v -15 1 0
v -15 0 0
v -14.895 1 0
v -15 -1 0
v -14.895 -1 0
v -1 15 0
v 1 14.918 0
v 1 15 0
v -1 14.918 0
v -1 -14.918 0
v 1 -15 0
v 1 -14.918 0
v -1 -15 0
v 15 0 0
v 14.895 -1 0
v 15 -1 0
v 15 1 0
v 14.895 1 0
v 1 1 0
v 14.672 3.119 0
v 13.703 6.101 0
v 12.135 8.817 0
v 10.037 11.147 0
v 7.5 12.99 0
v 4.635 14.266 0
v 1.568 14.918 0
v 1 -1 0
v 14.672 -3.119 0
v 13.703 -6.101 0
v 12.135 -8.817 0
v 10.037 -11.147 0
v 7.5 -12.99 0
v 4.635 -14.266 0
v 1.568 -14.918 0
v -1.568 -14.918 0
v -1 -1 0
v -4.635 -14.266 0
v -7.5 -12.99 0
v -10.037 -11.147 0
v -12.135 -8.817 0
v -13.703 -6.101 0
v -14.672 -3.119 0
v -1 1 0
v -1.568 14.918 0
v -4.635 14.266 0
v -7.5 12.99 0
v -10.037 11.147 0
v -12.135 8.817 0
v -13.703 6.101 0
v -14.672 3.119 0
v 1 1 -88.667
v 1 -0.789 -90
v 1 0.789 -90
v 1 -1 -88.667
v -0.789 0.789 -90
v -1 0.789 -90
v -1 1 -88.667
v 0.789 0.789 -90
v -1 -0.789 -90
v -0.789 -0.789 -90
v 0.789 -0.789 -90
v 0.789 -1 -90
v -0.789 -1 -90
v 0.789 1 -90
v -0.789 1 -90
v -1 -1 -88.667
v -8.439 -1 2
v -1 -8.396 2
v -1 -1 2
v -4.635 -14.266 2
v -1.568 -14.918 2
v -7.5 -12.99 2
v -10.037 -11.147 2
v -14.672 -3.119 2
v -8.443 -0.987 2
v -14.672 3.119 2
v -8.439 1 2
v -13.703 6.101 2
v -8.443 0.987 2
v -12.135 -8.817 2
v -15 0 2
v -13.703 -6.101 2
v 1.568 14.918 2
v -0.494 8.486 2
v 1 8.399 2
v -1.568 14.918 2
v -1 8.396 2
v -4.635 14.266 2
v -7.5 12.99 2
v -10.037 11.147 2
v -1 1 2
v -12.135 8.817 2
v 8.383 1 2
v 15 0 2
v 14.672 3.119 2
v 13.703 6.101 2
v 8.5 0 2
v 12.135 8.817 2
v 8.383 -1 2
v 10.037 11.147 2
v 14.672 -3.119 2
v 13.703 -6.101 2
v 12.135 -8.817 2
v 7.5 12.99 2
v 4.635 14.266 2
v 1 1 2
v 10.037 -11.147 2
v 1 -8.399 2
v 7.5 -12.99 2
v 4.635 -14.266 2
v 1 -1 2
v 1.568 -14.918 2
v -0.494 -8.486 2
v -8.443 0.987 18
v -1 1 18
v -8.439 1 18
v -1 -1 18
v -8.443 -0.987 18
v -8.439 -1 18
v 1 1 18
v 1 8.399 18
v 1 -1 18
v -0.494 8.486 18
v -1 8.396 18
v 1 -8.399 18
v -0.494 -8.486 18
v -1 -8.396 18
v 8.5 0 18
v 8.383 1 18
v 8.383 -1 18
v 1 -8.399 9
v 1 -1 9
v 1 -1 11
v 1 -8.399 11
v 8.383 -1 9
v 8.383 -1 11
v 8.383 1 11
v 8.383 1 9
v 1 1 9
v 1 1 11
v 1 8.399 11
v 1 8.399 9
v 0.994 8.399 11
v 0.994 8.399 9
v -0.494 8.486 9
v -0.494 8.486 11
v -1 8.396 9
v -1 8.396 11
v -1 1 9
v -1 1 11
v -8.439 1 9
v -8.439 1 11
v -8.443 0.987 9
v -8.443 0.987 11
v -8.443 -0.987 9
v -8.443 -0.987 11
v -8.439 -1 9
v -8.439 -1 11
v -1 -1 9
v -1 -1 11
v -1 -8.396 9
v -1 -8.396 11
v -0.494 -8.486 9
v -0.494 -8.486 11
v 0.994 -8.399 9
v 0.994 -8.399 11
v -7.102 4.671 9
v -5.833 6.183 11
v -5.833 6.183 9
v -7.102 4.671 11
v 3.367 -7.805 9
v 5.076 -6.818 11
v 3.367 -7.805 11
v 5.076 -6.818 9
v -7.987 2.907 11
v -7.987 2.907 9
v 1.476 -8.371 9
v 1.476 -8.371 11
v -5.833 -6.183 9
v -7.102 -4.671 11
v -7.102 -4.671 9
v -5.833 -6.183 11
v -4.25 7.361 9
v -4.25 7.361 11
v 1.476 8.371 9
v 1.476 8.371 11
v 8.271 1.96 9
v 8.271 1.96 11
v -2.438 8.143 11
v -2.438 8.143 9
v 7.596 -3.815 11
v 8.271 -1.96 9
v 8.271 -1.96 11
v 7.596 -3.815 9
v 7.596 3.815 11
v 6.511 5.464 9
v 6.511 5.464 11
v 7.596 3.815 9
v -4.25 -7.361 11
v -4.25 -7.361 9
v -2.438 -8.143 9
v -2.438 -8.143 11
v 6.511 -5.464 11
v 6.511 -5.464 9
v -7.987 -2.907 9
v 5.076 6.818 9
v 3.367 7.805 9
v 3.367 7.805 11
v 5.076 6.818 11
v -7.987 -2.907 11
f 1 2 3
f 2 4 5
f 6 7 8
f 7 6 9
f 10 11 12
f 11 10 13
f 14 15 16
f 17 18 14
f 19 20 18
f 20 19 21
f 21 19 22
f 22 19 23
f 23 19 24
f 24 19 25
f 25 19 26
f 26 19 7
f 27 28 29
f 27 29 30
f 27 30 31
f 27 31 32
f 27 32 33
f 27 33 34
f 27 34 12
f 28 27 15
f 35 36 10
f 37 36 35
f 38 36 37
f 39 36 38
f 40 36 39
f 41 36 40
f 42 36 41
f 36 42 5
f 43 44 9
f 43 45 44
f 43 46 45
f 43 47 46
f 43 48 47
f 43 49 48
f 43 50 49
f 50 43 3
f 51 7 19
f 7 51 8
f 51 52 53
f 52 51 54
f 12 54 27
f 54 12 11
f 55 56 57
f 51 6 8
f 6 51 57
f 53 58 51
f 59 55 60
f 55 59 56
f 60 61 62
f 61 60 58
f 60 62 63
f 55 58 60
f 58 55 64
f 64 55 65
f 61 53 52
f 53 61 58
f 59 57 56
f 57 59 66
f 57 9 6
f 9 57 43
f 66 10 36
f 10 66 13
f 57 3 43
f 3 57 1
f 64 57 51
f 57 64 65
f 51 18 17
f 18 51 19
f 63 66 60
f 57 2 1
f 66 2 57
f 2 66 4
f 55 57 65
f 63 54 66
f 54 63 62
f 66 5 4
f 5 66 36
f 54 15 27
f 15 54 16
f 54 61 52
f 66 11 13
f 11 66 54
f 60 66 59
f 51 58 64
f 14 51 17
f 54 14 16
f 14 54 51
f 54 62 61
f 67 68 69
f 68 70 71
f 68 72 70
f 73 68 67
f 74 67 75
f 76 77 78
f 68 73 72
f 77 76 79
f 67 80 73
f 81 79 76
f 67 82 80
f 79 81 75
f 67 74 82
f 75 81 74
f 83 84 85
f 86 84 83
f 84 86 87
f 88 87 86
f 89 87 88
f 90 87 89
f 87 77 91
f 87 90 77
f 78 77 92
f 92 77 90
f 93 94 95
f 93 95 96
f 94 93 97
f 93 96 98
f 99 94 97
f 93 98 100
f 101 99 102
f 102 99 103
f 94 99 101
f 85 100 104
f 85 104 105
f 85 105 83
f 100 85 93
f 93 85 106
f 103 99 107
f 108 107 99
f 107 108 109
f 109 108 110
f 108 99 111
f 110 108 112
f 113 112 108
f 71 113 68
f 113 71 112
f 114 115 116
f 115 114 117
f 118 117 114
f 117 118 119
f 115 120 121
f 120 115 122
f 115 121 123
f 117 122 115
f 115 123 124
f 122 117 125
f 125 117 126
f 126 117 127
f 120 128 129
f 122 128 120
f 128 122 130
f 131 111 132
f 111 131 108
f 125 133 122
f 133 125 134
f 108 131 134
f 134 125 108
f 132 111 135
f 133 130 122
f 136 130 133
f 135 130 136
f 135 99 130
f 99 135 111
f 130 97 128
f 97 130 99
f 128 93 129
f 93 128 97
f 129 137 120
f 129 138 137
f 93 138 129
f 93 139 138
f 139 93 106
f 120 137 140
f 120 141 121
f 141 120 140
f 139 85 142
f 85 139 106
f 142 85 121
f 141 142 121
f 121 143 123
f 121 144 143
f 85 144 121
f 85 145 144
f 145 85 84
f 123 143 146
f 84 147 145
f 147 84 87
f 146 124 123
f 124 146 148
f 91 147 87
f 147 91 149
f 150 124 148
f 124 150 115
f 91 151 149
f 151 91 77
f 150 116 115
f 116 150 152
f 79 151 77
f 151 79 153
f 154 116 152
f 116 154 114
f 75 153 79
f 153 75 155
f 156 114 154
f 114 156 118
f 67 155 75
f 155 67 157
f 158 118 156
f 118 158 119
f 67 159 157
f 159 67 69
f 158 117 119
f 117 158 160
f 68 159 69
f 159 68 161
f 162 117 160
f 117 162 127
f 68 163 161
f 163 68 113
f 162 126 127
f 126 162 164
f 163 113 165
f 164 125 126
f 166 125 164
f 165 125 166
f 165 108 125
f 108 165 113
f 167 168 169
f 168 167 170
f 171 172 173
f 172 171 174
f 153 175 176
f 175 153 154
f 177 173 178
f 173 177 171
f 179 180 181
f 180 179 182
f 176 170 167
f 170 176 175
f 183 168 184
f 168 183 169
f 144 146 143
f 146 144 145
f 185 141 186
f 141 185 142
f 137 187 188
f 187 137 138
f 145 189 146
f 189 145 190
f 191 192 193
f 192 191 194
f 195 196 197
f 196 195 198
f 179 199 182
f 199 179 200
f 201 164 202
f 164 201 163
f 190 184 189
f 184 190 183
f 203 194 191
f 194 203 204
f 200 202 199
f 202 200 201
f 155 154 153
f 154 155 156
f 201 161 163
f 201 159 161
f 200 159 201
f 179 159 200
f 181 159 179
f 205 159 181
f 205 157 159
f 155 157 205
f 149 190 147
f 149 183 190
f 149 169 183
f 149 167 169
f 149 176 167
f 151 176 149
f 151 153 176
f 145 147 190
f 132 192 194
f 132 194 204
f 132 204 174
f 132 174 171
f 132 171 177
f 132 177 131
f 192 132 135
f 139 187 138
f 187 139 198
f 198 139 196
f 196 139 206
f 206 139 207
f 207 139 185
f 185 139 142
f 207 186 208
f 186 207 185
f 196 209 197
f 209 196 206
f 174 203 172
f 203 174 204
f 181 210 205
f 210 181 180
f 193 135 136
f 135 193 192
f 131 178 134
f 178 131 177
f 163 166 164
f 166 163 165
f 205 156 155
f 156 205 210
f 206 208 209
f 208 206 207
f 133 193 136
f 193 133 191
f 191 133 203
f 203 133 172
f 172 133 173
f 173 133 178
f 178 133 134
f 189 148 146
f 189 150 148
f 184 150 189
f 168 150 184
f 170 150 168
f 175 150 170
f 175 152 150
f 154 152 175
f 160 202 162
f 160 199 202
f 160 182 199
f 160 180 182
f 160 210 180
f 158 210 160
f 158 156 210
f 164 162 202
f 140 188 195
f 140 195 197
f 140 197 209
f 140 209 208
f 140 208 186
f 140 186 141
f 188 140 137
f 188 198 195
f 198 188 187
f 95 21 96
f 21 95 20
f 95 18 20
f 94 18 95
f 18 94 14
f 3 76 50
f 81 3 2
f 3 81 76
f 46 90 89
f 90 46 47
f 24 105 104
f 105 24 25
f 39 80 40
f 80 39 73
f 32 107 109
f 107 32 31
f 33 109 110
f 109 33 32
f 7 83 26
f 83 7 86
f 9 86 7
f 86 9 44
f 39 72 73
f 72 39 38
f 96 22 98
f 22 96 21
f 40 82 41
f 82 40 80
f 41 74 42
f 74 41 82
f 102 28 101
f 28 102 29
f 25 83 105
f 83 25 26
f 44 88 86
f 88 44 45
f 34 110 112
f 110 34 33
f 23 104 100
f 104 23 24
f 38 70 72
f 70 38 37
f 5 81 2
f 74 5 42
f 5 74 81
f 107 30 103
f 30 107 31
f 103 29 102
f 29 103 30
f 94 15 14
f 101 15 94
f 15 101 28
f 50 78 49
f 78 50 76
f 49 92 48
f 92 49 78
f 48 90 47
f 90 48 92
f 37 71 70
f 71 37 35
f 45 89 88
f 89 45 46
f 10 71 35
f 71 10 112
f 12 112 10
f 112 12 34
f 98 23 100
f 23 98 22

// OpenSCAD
// [FL_INDEX: keywords="openscad, 3d_parametric, Stake_for_solar_landscape_light, csg_solid" | COT="Parametric OpenSCAD design from 3DCodeverse"]
// Title: Stake for solar landscape light

// how tall to make the top section
cap_riser_height = 16;
// the diameter of the top section
cap_riser_width = 17;
// how thick the top section's straight sections are (the + section)
cap_riser_thickness = 2;
// how far from the top to put the circular section of the top
cap_circle_offset = 9;

// how thick to make the circle dividing the point from the cap
cap_divider_thickness = 2;

// length of the stake's point
point_height = 95;
// radius of the top section of the stake
point_top_radius = 15;
// how much of the stake to cutoff, making it have a blunt edge
point_tip_cutoff = 5;
// how thick the stake's sections should be
point_thickness = 2;



/*****************
 The bottom pointy part
 */

module stake_edge(height, top_radius, tip_cutoff=10, thickness=2) {
  rotate([0, 90, 0])
    linear_extrude(height=thickness, center=true)
    difference() {
      // triangle
      polygon(points = [[0, 0], [0, top_radius], [height, 0]],
              paths=[[0, 1, 2]]);
    // the square for cutting off the tip
    translate([height - tip_cutoff, 0, 0]) {
      square([tip_cutoff, top_radius * 2]);
    }
  }
}

// all arguments expected to be in the same base syste
// final_radius should be about 5 (.5cm)
module stake_point(height, top_radius, tip_cutoff=10, thickness=2) {
  union() {
    stake_edge(height, top_radius, tip_cutoff, thickness);
    rotate(90) stake_edge(height, top_radius, tip_cutoff, thickness);
    rotate(180) stake_edge(height, top_radius, tip_cutoff, thickness);
    rotate(270) stake_edge(height, top_radius, tip_cutoff, thickness);
  }
}

module circle_at_top_of_point(radius, thickness) {
  linear_extrude(height=thickness)
    circle(r=radius);
}

/*****************
 The top section that the light goes on
 */

module cap_x_unrounded(width, thickness) {
    union() {
      translate([-width / 2.0, -thickness / 2.0])
        square([width, thickness], center=false);
      rotate([0, 0, 90])
        translate([-width / 2.0, -thickness / 2.0])
          square([width, thickness], center=false);
    }
}

module cap_x(riser_height, riser_width, riser_thickness) {
  linear_extrude(height=riser_height)
  // make a + but rounded off
  intersection() {
    cap_x_unrounded(riser_width, riser_thickness);
    circle(r=riser_width / 2.0);
  }
}

module cap_middle_circle(radius, thickness) {
  linear_extrude(height=thickness, center=false) circle(r=radius);
}

module cap_riser(riser_height, riser_width, cap_circle_offset, riser_thickness) {
  union() {
    cap_x(riser_height, riser_width, riser_thickness);
    translate([0, 0, riser_height - cap_circle_offset])
      cap_middle_circle(riser_width / 2.0, riser_thickness);
  }
}

module stake(point_height,
  point_top_radius,
  point_tip_cutoff,
  point_thickness,
  cap_divider_thickness,
  cap_riser_height,
  cap_riser_width,
  cap_riser_thickness,
  cap_circle_offset) {

  union() {
    stake_point(point_height, point_top_radius, point_tip_cutoff, point_thickness);
    circle_at_top_of_point(point_top_radius, cap_divider_thickness);

    translate([0, 0, cap_divider_thickness])
      cap_riser(cap_riser_height, cap_riser_width, cap_circle_offset, cap_riser_thickness);
  }
}

stake(point_height,
  point_top_radius,
  point_tip_cutoff,
  point_thickness,
  cap_divider_thickness,
  cap_riser_height,
  cap_riser_width,
  cap_riser_thickness,
  cap_circle_offset
);
